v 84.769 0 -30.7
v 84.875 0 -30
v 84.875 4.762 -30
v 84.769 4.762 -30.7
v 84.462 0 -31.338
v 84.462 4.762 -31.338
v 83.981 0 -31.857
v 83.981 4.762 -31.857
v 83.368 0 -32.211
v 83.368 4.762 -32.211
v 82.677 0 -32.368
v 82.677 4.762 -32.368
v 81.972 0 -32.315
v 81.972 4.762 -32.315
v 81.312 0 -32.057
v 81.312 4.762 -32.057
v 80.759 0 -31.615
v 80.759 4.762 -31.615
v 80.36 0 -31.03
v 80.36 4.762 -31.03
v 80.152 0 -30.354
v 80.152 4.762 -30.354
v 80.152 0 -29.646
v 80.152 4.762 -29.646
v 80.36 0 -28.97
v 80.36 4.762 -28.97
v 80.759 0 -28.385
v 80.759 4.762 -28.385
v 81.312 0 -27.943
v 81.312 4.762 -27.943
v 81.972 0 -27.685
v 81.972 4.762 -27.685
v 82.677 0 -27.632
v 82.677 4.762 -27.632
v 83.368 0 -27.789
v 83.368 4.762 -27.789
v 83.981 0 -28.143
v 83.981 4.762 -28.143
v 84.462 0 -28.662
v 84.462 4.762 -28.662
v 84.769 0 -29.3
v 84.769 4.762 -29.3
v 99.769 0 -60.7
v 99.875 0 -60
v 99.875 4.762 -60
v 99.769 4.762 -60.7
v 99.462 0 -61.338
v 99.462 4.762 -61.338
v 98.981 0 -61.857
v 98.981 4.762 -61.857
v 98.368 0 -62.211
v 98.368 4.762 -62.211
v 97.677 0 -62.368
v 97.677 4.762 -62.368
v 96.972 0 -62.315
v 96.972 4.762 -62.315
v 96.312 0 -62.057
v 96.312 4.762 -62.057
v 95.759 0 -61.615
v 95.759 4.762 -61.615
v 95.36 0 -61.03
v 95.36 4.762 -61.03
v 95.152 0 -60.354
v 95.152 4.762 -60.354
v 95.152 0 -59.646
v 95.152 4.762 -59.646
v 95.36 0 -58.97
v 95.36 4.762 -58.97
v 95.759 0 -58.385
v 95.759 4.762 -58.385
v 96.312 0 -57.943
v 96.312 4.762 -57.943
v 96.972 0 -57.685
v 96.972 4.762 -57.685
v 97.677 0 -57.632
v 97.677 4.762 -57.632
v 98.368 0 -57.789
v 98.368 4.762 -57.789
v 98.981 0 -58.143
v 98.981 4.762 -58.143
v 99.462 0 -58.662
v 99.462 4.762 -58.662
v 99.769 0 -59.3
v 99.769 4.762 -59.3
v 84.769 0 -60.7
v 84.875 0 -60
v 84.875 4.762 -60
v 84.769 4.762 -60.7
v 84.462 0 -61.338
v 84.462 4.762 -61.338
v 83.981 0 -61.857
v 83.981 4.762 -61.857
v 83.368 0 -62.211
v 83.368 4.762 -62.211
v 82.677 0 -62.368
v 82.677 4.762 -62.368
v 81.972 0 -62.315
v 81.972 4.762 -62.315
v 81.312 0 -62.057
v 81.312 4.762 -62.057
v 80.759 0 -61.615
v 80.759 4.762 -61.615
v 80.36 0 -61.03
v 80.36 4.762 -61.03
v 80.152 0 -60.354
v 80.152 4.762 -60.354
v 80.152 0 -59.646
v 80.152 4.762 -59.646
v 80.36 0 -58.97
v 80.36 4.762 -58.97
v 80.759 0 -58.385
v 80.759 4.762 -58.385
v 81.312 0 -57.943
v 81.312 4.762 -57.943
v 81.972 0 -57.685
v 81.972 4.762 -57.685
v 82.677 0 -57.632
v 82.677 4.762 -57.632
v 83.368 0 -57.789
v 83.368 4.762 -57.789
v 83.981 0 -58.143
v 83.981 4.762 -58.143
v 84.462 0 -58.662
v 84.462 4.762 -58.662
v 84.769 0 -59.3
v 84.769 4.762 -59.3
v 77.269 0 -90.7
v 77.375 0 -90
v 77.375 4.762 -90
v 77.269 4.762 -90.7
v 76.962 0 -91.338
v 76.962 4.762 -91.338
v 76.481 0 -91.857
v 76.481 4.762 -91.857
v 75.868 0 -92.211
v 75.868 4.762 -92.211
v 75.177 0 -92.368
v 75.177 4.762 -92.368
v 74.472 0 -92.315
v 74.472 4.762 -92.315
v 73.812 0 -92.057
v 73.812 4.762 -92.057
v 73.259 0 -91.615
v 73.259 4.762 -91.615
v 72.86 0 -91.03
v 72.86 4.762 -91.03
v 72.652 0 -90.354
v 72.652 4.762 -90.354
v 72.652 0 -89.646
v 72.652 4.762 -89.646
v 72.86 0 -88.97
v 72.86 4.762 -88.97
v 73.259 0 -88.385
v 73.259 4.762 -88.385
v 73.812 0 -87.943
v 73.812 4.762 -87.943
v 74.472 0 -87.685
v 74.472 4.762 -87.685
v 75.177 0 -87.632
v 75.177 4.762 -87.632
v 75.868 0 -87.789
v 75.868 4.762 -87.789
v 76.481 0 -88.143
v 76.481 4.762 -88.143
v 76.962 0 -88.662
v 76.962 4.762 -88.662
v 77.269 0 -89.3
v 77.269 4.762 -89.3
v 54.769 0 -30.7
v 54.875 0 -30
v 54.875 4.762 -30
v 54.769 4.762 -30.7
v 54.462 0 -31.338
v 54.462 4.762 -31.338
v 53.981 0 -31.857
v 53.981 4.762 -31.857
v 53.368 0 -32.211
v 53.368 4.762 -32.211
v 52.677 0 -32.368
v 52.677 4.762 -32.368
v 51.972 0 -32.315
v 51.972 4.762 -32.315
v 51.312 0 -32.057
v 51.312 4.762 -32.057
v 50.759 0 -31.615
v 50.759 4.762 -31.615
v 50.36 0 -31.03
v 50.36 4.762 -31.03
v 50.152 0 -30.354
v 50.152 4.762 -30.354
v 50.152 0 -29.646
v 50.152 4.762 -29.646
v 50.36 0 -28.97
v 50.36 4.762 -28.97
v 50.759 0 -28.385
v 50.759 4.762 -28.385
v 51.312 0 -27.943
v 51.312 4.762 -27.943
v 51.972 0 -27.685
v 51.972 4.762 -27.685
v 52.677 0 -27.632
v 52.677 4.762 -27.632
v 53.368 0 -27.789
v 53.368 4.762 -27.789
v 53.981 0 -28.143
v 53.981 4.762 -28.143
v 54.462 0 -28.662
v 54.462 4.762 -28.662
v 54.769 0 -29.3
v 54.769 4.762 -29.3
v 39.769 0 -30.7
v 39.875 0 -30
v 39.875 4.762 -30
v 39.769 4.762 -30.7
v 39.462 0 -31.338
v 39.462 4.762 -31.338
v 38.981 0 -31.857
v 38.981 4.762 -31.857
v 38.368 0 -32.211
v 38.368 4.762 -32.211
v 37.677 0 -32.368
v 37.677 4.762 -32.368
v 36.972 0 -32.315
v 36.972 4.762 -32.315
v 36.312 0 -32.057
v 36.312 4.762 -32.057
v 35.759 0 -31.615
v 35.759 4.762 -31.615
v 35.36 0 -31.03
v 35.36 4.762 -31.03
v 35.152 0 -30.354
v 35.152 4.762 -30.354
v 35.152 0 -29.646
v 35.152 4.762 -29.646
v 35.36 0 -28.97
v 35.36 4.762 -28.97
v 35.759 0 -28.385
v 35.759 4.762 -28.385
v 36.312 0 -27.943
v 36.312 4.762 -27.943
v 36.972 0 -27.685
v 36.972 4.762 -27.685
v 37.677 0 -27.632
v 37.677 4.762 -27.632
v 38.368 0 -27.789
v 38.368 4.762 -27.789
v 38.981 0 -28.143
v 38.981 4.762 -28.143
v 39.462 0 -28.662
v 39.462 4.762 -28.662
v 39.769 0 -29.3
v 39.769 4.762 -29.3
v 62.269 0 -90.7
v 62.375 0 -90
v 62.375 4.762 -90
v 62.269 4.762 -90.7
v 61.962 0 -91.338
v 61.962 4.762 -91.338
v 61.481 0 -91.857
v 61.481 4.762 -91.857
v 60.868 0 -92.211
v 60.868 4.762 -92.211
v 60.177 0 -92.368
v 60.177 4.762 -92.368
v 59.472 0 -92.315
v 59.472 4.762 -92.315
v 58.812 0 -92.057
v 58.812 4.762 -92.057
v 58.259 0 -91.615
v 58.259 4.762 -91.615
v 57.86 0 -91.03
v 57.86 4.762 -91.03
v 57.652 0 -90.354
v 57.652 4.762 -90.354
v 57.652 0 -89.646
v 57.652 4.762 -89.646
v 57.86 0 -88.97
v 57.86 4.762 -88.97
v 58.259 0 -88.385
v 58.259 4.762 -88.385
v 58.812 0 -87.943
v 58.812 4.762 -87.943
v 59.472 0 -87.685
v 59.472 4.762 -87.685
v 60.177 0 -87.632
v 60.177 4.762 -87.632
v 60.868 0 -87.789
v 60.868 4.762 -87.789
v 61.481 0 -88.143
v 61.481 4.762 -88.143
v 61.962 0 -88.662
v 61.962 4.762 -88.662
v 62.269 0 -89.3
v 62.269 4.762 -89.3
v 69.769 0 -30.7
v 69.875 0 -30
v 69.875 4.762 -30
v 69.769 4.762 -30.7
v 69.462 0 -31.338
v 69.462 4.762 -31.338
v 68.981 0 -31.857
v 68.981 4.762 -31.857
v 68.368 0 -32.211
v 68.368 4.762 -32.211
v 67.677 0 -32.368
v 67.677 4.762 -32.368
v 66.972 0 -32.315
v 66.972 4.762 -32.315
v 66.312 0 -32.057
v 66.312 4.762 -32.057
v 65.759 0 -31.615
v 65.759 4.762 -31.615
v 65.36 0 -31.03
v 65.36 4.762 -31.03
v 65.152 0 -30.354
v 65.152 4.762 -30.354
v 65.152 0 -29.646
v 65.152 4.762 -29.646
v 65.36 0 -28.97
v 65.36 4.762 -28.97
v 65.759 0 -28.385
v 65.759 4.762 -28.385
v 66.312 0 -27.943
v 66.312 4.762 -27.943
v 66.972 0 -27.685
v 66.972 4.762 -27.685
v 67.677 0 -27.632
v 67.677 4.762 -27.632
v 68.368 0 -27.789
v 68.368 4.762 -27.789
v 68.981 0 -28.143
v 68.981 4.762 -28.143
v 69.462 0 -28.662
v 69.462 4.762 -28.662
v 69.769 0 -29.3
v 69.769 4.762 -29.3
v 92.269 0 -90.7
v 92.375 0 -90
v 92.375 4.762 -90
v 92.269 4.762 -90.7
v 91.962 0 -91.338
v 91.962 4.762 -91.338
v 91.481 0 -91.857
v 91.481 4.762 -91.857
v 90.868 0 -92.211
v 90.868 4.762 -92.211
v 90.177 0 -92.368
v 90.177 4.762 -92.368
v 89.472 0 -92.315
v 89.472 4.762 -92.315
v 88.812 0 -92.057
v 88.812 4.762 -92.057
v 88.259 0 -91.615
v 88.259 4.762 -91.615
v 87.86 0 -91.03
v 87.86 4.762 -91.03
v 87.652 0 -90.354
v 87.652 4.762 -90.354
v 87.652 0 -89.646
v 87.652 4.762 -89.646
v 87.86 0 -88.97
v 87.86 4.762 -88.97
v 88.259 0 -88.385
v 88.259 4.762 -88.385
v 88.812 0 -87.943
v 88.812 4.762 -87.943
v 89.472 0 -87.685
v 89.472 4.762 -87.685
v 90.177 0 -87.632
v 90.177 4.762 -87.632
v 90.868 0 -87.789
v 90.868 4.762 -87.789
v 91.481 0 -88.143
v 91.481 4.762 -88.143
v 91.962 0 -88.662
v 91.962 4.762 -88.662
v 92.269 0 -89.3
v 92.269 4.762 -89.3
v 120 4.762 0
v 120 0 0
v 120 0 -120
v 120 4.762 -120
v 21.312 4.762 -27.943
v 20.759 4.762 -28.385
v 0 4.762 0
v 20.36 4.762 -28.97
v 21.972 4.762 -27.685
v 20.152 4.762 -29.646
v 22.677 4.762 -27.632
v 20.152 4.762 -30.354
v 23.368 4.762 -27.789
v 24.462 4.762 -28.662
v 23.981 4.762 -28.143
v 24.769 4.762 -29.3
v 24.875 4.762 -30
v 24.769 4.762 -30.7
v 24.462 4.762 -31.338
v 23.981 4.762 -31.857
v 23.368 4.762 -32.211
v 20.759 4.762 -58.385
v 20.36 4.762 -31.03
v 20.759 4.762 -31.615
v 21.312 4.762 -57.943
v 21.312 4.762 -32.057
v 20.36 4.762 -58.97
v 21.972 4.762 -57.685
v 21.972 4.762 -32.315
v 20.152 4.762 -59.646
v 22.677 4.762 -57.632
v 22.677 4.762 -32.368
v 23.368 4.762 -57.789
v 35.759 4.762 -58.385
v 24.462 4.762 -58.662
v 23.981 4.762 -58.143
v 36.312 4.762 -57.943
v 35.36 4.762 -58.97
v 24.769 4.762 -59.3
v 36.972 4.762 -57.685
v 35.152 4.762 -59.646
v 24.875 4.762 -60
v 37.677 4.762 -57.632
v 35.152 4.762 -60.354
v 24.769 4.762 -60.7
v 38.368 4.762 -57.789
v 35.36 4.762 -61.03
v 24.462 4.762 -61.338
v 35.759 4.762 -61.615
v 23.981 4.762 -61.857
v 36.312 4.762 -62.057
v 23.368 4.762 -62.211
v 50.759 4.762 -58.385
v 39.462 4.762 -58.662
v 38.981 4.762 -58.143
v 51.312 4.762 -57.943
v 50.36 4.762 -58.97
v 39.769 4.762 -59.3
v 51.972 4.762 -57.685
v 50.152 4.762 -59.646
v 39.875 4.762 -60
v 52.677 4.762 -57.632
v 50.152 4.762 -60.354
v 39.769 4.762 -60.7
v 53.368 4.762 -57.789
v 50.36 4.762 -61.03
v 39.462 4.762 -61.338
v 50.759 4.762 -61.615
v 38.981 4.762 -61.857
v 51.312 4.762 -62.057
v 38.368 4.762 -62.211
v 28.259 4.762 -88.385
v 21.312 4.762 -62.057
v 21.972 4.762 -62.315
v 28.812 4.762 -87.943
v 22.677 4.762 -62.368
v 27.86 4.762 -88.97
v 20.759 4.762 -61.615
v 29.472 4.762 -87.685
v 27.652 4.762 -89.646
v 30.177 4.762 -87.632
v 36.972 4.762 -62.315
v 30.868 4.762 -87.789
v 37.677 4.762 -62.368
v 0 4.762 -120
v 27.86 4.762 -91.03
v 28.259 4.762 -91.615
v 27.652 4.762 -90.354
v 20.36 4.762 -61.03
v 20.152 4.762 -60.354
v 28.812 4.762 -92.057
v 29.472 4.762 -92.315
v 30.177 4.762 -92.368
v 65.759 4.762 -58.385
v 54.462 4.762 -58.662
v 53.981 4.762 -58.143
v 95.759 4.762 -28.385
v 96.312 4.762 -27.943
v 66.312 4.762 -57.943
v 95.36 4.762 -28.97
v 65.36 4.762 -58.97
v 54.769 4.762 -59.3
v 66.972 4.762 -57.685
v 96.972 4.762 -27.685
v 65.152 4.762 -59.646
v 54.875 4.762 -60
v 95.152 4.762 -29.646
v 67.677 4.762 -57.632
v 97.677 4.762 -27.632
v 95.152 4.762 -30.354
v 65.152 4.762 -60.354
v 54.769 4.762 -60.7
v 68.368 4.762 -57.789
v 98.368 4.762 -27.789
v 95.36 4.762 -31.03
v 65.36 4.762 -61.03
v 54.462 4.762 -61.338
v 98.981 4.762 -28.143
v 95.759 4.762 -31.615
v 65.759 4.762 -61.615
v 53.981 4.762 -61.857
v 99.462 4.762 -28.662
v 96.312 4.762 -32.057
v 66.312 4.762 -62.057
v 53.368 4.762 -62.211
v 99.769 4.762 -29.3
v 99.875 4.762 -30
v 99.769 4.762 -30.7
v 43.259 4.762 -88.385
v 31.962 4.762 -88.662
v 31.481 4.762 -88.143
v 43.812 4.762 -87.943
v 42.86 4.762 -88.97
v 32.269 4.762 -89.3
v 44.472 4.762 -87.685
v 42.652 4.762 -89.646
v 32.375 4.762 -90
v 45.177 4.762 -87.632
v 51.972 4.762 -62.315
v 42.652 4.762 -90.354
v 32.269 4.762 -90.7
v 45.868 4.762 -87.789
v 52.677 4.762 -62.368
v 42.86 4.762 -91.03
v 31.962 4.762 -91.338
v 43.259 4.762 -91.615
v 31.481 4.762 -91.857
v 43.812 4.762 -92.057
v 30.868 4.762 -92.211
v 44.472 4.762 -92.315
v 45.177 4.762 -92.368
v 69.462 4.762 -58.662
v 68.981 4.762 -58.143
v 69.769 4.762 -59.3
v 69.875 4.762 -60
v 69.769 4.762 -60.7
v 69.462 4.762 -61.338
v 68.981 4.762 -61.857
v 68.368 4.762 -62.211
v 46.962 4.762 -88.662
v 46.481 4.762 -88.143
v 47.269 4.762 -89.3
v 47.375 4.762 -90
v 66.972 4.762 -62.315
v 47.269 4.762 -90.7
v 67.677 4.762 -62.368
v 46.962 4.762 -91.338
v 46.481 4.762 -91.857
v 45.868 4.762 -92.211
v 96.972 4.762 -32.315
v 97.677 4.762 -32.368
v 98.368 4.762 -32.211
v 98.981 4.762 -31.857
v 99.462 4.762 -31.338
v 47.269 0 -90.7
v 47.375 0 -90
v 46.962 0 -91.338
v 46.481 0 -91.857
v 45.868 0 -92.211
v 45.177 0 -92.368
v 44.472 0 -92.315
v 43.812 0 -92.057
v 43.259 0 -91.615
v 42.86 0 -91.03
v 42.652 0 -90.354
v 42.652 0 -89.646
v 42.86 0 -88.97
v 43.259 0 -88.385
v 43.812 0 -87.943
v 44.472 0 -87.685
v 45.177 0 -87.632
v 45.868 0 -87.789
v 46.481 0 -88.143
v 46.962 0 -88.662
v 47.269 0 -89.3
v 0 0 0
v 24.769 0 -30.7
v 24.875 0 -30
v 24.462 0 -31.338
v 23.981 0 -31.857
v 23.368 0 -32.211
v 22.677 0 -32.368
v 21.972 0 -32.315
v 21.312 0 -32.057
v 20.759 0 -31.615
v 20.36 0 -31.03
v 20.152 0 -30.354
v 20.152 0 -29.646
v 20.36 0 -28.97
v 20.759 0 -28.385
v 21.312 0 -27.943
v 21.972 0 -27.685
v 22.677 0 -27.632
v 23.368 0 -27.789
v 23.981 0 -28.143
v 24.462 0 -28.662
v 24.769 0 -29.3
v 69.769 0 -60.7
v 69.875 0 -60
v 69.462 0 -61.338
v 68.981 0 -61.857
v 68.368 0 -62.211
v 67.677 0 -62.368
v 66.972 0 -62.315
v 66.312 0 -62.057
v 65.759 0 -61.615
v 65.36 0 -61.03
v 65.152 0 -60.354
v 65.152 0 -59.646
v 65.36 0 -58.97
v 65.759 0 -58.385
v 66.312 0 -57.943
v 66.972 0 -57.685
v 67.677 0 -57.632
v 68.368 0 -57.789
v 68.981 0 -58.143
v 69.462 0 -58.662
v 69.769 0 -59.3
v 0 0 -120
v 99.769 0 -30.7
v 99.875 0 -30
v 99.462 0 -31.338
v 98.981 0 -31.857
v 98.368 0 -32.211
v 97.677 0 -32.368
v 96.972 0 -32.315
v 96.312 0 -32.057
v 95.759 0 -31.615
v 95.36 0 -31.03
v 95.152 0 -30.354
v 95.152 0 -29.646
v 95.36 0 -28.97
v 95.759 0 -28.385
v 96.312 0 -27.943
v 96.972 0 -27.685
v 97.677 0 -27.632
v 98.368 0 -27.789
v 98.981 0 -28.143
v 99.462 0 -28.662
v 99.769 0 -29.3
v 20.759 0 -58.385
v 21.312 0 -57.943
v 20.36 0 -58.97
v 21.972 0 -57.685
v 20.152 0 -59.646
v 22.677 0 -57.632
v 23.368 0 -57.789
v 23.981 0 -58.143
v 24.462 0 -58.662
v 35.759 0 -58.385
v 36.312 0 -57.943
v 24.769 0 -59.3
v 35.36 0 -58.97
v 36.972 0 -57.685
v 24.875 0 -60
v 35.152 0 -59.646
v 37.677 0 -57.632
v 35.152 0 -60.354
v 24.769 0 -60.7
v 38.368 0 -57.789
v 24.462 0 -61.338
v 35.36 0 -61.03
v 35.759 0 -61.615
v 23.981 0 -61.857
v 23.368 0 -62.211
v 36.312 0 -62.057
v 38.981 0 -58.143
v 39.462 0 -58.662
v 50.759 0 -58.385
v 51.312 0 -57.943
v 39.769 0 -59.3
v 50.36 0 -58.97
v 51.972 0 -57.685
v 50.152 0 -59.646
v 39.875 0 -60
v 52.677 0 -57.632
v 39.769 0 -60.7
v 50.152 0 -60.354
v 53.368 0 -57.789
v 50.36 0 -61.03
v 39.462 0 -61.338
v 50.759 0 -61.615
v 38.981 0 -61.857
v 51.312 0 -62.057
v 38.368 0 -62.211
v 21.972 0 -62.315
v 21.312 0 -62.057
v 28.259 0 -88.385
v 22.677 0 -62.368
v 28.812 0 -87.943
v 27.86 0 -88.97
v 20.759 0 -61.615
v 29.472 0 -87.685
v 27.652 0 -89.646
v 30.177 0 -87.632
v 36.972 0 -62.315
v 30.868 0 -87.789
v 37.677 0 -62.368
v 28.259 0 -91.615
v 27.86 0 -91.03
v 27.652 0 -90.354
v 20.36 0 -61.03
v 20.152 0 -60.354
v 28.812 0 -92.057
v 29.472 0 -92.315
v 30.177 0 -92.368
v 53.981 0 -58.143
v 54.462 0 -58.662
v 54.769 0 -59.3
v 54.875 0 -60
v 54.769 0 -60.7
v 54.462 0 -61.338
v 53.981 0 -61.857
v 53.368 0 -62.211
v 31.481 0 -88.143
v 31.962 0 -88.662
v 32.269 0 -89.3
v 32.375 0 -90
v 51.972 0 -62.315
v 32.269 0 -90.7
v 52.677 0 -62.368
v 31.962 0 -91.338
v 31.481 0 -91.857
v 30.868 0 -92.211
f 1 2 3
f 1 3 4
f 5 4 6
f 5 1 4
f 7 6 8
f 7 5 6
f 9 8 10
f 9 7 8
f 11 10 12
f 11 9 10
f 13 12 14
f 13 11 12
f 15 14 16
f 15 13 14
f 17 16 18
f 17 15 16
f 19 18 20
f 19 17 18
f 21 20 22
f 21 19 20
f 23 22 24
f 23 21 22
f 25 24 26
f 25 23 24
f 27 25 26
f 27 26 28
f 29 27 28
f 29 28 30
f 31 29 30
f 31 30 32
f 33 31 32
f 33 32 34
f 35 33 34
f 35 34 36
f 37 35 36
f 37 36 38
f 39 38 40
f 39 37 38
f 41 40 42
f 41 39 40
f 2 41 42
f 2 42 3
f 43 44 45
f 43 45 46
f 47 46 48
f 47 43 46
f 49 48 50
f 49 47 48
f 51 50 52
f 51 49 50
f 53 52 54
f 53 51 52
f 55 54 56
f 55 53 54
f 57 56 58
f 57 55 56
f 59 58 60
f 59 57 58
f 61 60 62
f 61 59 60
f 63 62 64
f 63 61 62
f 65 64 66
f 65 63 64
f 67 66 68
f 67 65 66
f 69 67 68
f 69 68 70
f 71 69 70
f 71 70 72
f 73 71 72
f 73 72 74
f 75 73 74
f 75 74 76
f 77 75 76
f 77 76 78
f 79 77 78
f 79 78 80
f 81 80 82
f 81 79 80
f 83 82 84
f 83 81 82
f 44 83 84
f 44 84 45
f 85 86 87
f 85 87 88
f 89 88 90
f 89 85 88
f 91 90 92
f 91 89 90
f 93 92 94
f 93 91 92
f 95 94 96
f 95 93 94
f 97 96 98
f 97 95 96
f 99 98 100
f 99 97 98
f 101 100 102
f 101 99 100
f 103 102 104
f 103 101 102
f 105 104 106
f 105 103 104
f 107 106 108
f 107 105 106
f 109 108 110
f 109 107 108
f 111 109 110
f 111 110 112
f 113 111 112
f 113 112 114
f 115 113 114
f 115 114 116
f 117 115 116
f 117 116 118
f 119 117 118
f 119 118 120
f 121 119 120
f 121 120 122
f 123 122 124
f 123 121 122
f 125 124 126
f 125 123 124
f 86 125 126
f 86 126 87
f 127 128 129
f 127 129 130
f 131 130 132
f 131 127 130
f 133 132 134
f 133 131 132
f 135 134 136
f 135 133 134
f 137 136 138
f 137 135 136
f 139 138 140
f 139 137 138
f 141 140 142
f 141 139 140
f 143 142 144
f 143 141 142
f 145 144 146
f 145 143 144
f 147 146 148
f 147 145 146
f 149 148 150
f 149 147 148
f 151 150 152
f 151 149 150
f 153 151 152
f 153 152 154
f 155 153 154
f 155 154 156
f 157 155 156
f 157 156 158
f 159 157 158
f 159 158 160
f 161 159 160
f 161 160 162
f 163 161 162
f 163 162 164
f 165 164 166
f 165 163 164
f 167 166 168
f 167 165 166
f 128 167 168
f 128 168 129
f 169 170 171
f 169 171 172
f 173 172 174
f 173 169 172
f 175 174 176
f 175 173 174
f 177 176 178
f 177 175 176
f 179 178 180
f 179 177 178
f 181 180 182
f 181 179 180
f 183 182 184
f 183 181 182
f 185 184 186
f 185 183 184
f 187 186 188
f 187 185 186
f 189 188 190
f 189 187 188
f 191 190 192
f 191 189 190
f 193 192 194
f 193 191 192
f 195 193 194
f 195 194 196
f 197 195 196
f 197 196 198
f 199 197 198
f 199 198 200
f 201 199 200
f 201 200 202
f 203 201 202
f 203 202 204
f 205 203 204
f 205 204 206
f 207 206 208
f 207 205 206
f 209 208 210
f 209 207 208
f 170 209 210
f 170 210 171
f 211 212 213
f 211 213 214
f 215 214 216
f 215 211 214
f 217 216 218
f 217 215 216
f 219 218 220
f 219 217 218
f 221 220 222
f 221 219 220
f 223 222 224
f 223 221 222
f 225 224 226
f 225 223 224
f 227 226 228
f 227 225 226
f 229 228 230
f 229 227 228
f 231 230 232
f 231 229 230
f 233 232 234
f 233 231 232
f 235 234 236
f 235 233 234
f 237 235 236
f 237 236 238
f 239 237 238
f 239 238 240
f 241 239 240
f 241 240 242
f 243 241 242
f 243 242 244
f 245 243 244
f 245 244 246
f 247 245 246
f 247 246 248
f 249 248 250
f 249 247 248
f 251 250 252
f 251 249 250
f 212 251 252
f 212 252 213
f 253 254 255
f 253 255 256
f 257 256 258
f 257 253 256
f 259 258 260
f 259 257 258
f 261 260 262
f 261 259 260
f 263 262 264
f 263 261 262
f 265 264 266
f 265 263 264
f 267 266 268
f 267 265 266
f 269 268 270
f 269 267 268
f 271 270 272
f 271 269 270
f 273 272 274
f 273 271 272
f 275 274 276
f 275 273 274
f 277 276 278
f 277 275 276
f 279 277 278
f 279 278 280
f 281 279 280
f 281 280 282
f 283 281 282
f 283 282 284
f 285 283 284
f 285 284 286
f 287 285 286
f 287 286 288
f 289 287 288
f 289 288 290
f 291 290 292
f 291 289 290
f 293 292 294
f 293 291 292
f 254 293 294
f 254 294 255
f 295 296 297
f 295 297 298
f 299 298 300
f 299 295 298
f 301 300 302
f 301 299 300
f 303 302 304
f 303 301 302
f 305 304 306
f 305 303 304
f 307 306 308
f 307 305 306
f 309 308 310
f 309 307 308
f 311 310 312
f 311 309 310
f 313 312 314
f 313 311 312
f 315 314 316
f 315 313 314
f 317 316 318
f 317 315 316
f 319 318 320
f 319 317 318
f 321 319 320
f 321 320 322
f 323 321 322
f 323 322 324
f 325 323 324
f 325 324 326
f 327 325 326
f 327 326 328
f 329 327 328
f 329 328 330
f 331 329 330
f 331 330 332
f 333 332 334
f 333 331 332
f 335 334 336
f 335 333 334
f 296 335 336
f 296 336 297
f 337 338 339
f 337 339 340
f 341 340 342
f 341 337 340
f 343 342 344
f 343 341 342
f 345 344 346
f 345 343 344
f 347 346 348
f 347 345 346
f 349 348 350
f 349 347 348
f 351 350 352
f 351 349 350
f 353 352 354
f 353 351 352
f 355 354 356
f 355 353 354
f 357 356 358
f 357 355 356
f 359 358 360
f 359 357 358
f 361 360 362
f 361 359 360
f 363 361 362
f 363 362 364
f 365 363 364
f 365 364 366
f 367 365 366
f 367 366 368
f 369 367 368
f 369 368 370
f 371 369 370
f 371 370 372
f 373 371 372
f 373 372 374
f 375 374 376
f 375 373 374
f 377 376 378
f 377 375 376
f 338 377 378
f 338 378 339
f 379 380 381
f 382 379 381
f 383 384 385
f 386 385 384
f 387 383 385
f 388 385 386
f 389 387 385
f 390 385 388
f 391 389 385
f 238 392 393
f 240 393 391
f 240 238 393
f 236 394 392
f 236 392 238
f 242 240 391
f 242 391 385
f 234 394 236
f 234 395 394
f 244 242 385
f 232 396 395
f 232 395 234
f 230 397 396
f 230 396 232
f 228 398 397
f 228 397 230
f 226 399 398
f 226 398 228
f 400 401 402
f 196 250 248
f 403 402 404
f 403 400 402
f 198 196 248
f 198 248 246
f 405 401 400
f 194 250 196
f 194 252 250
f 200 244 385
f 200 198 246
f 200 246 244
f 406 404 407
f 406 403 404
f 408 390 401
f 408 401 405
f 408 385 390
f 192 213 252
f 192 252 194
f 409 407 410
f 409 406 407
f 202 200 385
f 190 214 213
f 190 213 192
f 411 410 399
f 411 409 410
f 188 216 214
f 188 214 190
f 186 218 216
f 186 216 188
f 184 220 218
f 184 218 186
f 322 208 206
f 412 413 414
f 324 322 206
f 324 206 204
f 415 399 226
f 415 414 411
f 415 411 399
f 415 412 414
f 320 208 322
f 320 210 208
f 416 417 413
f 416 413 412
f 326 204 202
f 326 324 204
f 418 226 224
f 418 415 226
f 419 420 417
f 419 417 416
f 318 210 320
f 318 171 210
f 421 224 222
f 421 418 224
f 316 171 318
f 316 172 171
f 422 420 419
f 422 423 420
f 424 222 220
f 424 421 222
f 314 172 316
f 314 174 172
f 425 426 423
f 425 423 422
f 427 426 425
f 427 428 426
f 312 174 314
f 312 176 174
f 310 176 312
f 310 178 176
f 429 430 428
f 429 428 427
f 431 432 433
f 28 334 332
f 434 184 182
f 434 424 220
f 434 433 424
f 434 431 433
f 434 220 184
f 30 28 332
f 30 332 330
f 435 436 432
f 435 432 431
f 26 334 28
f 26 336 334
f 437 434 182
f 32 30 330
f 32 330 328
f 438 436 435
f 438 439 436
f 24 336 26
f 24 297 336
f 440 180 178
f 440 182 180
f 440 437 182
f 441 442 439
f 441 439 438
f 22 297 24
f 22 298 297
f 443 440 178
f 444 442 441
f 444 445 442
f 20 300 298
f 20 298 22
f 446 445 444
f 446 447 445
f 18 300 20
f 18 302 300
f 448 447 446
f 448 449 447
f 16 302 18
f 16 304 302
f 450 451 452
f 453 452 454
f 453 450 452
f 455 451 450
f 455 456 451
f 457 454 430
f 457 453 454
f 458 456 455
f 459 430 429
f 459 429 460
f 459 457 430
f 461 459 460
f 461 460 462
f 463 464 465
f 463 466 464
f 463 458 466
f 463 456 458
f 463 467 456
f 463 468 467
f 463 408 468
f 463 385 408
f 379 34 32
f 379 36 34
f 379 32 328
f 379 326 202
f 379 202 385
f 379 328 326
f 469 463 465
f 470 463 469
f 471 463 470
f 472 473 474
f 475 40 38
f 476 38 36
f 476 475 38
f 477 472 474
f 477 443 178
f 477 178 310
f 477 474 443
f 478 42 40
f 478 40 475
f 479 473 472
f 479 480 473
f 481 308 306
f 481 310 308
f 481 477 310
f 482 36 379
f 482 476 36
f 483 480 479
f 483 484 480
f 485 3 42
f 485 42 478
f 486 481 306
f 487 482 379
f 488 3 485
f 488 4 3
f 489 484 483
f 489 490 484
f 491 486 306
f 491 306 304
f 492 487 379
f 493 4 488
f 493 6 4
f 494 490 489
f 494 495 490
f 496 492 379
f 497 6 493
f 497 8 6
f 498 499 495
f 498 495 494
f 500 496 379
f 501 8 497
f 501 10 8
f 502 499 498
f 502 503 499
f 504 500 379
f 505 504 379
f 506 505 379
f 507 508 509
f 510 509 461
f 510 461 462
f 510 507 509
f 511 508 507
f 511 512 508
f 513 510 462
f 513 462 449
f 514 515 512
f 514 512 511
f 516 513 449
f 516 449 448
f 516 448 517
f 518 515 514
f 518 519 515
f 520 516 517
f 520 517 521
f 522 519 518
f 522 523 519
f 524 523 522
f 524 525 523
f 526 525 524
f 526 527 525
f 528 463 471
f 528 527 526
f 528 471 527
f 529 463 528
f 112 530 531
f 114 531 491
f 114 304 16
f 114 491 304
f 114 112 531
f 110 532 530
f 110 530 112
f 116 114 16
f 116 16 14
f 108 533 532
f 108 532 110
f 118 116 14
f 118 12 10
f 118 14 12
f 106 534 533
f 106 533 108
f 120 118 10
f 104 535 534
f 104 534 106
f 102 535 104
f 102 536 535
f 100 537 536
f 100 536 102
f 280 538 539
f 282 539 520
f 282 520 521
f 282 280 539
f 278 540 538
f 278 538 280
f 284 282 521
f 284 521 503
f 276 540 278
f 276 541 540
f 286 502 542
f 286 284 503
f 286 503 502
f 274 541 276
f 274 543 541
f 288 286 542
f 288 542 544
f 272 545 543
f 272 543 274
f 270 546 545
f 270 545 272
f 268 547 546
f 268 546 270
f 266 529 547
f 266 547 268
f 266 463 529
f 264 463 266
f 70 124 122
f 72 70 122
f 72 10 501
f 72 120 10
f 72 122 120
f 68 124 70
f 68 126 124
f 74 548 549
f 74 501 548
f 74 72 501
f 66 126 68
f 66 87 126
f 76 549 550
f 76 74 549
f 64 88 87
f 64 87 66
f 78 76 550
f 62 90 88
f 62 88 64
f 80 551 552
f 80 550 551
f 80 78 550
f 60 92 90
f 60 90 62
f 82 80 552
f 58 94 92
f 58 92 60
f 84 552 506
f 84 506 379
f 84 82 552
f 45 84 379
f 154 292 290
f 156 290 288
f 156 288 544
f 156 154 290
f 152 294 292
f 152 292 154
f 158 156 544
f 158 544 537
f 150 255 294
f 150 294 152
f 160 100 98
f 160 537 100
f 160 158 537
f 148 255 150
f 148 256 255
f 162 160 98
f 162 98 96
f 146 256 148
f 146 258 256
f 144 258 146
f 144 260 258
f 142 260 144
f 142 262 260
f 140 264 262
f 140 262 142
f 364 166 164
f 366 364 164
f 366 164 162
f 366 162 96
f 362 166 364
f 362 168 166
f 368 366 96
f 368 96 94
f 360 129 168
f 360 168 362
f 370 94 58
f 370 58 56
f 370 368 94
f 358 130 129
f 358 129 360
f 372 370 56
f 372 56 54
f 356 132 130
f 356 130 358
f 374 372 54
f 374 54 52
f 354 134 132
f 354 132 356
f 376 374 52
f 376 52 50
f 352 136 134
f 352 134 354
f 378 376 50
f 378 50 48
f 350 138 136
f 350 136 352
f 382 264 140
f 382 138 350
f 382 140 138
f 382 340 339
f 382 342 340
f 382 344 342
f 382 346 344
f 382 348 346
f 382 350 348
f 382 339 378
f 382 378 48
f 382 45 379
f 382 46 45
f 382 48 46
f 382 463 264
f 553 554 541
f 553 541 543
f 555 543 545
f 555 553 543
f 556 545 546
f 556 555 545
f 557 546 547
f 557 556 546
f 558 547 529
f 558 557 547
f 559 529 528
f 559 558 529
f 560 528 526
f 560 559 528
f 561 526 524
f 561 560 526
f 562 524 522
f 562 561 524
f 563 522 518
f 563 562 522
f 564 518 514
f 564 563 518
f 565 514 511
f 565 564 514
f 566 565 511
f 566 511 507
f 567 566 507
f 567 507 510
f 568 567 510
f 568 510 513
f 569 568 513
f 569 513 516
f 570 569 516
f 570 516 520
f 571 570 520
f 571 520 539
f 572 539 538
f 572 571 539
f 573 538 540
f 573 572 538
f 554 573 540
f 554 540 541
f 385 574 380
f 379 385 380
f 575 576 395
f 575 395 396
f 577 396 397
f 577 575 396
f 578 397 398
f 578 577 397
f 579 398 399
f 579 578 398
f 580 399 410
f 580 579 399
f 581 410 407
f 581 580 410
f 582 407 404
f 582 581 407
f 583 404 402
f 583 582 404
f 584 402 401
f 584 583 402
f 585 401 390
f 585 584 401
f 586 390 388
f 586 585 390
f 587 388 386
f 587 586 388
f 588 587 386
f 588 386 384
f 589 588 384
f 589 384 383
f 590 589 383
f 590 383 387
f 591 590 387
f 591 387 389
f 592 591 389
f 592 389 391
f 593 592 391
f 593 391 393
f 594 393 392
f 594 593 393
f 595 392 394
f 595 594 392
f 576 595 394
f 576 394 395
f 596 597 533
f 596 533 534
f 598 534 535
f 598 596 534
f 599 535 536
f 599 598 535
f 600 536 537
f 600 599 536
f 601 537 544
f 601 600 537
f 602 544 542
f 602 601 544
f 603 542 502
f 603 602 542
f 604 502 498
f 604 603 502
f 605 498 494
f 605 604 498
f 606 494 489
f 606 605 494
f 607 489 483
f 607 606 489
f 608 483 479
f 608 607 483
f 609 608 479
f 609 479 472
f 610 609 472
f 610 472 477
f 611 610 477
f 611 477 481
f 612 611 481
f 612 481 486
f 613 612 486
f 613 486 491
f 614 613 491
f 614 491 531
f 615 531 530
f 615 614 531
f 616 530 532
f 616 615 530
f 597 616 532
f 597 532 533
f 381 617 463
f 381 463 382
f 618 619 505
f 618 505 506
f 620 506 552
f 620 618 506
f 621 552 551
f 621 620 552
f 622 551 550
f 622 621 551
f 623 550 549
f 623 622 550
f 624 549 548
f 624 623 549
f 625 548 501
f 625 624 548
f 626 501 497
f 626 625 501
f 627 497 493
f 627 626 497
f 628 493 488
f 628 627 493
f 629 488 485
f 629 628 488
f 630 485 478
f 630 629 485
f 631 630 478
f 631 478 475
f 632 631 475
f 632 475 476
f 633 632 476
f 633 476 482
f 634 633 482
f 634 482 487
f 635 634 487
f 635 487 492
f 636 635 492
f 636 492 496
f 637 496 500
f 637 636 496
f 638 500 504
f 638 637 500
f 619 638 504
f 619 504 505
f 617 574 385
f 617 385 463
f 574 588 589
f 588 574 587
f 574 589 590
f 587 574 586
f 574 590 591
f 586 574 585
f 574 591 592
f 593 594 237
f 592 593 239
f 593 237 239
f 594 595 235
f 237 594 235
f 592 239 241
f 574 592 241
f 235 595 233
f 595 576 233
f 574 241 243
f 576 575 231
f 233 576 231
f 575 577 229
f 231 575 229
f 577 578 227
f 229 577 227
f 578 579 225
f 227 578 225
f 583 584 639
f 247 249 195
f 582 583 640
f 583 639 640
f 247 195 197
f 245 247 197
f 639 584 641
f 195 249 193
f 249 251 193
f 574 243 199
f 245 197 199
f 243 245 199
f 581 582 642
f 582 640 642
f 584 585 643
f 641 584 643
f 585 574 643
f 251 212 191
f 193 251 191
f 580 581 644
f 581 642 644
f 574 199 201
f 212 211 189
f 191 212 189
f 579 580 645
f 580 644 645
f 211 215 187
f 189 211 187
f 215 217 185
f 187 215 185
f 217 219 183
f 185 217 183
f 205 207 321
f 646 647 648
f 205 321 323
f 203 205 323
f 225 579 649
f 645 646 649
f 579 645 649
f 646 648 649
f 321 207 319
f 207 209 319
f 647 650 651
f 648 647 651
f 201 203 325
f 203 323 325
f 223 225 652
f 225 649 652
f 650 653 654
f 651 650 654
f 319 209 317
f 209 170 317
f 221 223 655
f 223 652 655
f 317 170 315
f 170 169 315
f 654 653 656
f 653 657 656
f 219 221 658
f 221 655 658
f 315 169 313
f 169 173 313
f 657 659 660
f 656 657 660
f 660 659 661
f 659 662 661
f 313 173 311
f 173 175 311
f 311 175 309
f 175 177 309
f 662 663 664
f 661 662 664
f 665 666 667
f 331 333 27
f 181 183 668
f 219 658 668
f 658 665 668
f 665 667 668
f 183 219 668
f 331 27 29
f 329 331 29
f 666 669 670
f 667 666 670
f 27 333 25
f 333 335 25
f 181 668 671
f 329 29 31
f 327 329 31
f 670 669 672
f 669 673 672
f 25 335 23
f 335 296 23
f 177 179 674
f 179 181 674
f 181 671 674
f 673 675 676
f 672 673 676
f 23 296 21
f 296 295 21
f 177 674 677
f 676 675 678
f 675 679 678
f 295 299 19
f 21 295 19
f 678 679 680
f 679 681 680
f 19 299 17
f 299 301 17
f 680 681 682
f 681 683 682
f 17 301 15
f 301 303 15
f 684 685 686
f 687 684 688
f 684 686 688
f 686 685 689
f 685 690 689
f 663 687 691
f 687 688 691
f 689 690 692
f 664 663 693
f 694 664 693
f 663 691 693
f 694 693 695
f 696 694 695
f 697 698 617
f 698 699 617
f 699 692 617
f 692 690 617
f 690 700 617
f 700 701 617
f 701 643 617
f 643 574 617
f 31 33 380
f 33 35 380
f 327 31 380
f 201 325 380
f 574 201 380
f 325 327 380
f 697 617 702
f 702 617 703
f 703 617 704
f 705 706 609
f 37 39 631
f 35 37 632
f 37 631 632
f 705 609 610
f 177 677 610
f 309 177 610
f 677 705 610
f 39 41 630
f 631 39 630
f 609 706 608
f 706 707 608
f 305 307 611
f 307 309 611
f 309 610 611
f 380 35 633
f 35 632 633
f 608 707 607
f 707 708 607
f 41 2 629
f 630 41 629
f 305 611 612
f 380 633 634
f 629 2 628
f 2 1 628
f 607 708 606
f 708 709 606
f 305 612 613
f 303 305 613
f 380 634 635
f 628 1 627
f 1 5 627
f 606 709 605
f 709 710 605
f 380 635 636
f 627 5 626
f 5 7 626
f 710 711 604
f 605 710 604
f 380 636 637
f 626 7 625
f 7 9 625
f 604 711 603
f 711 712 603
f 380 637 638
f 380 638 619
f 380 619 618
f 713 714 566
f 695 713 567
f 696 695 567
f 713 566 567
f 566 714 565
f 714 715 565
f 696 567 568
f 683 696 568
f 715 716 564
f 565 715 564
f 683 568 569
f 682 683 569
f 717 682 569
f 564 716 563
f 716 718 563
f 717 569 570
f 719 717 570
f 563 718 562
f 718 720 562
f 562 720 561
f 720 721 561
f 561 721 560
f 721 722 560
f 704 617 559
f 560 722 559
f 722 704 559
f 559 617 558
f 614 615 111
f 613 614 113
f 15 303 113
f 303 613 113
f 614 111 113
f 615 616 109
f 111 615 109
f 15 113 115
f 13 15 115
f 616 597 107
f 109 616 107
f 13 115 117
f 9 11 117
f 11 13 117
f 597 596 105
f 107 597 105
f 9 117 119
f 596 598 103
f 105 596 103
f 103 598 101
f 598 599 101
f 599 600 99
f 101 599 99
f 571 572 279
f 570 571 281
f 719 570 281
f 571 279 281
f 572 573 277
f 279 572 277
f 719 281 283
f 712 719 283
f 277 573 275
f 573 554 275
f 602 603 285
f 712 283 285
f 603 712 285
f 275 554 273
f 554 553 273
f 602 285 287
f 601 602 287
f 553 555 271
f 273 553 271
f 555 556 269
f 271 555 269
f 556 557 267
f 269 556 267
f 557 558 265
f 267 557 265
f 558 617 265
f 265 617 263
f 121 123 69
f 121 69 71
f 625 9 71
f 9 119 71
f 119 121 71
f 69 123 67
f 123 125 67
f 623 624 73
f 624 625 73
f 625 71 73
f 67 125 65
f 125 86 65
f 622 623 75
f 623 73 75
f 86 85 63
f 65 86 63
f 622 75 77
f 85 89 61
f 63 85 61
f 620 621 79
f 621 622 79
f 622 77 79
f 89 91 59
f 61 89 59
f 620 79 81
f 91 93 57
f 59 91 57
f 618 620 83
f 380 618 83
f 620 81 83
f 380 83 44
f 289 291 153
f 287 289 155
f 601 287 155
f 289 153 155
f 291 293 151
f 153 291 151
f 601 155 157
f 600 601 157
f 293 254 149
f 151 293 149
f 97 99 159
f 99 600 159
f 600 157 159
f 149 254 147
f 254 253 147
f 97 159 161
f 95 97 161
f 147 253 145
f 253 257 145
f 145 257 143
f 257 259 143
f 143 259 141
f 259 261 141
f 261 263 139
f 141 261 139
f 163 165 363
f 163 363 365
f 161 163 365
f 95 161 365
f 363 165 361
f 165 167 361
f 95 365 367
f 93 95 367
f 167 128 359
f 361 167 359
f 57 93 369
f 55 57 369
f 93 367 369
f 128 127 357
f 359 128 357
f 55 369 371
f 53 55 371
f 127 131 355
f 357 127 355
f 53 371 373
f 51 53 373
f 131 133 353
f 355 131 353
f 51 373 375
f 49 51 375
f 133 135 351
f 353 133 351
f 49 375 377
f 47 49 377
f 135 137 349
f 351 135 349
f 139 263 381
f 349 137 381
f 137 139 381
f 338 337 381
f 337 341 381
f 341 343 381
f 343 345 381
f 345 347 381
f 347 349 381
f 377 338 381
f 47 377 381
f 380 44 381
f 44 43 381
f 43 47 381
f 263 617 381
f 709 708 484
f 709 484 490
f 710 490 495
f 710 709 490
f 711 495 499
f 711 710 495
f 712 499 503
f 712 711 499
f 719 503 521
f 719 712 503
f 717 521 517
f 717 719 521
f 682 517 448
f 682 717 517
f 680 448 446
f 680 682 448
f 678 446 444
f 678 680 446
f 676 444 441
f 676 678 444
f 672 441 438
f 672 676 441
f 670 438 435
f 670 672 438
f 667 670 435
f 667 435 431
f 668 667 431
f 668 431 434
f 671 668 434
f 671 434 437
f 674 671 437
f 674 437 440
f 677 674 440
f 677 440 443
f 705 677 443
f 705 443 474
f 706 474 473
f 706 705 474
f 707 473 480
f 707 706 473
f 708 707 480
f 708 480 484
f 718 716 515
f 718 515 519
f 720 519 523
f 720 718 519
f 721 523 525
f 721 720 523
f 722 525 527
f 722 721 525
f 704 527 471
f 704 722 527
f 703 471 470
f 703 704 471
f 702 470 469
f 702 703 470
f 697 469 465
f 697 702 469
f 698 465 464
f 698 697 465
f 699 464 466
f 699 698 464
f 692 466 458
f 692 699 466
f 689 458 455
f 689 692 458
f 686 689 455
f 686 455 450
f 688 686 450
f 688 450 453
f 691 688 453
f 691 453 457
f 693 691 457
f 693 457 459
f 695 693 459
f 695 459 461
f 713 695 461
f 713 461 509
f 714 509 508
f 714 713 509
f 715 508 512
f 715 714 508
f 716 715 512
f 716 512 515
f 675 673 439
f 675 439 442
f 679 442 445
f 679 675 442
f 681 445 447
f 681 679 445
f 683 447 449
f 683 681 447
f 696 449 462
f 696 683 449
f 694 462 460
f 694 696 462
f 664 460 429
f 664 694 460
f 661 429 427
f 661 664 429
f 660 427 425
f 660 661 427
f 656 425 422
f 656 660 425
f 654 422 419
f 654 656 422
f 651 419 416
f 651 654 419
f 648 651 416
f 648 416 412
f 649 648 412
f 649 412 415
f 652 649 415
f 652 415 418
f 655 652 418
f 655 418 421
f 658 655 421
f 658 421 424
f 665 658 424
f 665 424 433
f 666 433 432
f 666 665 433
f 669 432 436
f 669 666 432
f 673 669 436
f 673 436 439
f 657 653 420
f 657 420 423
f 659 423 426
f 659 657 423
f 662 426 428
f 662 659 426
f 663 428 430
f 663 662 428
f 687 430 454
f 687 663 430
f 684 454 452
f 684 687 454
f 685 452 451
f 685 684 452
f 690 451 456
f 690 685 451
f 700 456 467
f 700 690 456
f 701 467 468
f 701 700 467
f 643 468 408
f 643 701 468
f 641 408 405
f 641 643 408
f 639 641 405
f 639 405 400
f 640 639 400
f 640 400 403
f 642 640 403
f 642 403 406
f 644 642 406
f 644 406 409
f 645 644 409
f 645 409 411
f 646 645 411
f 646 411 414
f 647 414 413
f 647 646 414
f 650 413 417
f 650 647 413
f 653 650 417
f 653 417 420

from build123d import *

# Parameters (mm, degrees)
SKETCH1_W           = 120
SKETCH1_H           = 120
SKETCH1_R           = 2.375
BOSS_EXTRUDE1_DEPTH = 4.7625


with BuildPart() as part:
    # Sketch1 → Boss-Extrude1 (new body)
    with BuildSketch(Plane(origin=(0, 0, 0), x_dir=(1, 0, 0), z_dir=(0, 1, 0))):
        with Locations((60, 60)):
            Rectangle(SKETCH1_W, SKETCH1_H)
        with Locations((30, 90)):
            Circle(SKETCH1_R, mode=Mode.SUBTRACT)
        with Locations((45, 90)):
            Circle(SKETCH1_R, mode=Mode.SUBTRACT)
        with Locations((60, 90)):
            Circle(SKETCH1_R, mode=Mode.SUBTRACT)
        with Locations((75, 90)):
            Circle(SKETCH1_R, mode=Mode.SUBTRACT)
        with Locations((90, 90)):
            Circle(SKETCH1_R, mode=Mode.SUBTRACT)
        with Locations((97.5, 60)):
            Circle(SKETCH1_R, mode=Mode.SUBTRACT)
        with Locations((82.5, 60)):
            Circle(SKETCH1_R, mode=Mode.SUBTRACT)
        with Locations((67.5, 60)):
            Circle(SKETCH1_R, mode=Mode.SUBTRACT)
        with Locations((52.5, 60)):
            Circle(SKETCH1_R, mode=Mode.SUBTRACT)
        with Locations((37.5, 60)):
            Circle(SKETCH1_R, mode=Mode.SUBTRACT)
        with Locations((22.5, 30)):
            Circle(SKETCH1_R, mode=Mode.SUBTRACT)
        with Locations((37.5, 30)):
            Circle(SKETCH1_R, mode=Mode.SUBTRACT)
        with Locations((52.5, 30)):
            Circle(SKETCH1_R, mode=Mode.SUBTRACT)
        with Locations((67.5, 30)):
            Circle(SKETCH1_R, mode=Mode.SUBTRACT)
        with Locations((82.5, 30)):
            Circle(SKETCH1_R, mode=Mode.SUBTRACT)
        with Locations((97.5, 30)):
            Circle(SKETCH1_R, mode=Mode.SUBTRACT)
        with Locations((22.5, 60)):
            Circle(SKETCH1_R, mode=Mode.SUBTRACT)
    extrude(amount=BOSS_EXTRUDE1_DEPTH)


solid = part.part
